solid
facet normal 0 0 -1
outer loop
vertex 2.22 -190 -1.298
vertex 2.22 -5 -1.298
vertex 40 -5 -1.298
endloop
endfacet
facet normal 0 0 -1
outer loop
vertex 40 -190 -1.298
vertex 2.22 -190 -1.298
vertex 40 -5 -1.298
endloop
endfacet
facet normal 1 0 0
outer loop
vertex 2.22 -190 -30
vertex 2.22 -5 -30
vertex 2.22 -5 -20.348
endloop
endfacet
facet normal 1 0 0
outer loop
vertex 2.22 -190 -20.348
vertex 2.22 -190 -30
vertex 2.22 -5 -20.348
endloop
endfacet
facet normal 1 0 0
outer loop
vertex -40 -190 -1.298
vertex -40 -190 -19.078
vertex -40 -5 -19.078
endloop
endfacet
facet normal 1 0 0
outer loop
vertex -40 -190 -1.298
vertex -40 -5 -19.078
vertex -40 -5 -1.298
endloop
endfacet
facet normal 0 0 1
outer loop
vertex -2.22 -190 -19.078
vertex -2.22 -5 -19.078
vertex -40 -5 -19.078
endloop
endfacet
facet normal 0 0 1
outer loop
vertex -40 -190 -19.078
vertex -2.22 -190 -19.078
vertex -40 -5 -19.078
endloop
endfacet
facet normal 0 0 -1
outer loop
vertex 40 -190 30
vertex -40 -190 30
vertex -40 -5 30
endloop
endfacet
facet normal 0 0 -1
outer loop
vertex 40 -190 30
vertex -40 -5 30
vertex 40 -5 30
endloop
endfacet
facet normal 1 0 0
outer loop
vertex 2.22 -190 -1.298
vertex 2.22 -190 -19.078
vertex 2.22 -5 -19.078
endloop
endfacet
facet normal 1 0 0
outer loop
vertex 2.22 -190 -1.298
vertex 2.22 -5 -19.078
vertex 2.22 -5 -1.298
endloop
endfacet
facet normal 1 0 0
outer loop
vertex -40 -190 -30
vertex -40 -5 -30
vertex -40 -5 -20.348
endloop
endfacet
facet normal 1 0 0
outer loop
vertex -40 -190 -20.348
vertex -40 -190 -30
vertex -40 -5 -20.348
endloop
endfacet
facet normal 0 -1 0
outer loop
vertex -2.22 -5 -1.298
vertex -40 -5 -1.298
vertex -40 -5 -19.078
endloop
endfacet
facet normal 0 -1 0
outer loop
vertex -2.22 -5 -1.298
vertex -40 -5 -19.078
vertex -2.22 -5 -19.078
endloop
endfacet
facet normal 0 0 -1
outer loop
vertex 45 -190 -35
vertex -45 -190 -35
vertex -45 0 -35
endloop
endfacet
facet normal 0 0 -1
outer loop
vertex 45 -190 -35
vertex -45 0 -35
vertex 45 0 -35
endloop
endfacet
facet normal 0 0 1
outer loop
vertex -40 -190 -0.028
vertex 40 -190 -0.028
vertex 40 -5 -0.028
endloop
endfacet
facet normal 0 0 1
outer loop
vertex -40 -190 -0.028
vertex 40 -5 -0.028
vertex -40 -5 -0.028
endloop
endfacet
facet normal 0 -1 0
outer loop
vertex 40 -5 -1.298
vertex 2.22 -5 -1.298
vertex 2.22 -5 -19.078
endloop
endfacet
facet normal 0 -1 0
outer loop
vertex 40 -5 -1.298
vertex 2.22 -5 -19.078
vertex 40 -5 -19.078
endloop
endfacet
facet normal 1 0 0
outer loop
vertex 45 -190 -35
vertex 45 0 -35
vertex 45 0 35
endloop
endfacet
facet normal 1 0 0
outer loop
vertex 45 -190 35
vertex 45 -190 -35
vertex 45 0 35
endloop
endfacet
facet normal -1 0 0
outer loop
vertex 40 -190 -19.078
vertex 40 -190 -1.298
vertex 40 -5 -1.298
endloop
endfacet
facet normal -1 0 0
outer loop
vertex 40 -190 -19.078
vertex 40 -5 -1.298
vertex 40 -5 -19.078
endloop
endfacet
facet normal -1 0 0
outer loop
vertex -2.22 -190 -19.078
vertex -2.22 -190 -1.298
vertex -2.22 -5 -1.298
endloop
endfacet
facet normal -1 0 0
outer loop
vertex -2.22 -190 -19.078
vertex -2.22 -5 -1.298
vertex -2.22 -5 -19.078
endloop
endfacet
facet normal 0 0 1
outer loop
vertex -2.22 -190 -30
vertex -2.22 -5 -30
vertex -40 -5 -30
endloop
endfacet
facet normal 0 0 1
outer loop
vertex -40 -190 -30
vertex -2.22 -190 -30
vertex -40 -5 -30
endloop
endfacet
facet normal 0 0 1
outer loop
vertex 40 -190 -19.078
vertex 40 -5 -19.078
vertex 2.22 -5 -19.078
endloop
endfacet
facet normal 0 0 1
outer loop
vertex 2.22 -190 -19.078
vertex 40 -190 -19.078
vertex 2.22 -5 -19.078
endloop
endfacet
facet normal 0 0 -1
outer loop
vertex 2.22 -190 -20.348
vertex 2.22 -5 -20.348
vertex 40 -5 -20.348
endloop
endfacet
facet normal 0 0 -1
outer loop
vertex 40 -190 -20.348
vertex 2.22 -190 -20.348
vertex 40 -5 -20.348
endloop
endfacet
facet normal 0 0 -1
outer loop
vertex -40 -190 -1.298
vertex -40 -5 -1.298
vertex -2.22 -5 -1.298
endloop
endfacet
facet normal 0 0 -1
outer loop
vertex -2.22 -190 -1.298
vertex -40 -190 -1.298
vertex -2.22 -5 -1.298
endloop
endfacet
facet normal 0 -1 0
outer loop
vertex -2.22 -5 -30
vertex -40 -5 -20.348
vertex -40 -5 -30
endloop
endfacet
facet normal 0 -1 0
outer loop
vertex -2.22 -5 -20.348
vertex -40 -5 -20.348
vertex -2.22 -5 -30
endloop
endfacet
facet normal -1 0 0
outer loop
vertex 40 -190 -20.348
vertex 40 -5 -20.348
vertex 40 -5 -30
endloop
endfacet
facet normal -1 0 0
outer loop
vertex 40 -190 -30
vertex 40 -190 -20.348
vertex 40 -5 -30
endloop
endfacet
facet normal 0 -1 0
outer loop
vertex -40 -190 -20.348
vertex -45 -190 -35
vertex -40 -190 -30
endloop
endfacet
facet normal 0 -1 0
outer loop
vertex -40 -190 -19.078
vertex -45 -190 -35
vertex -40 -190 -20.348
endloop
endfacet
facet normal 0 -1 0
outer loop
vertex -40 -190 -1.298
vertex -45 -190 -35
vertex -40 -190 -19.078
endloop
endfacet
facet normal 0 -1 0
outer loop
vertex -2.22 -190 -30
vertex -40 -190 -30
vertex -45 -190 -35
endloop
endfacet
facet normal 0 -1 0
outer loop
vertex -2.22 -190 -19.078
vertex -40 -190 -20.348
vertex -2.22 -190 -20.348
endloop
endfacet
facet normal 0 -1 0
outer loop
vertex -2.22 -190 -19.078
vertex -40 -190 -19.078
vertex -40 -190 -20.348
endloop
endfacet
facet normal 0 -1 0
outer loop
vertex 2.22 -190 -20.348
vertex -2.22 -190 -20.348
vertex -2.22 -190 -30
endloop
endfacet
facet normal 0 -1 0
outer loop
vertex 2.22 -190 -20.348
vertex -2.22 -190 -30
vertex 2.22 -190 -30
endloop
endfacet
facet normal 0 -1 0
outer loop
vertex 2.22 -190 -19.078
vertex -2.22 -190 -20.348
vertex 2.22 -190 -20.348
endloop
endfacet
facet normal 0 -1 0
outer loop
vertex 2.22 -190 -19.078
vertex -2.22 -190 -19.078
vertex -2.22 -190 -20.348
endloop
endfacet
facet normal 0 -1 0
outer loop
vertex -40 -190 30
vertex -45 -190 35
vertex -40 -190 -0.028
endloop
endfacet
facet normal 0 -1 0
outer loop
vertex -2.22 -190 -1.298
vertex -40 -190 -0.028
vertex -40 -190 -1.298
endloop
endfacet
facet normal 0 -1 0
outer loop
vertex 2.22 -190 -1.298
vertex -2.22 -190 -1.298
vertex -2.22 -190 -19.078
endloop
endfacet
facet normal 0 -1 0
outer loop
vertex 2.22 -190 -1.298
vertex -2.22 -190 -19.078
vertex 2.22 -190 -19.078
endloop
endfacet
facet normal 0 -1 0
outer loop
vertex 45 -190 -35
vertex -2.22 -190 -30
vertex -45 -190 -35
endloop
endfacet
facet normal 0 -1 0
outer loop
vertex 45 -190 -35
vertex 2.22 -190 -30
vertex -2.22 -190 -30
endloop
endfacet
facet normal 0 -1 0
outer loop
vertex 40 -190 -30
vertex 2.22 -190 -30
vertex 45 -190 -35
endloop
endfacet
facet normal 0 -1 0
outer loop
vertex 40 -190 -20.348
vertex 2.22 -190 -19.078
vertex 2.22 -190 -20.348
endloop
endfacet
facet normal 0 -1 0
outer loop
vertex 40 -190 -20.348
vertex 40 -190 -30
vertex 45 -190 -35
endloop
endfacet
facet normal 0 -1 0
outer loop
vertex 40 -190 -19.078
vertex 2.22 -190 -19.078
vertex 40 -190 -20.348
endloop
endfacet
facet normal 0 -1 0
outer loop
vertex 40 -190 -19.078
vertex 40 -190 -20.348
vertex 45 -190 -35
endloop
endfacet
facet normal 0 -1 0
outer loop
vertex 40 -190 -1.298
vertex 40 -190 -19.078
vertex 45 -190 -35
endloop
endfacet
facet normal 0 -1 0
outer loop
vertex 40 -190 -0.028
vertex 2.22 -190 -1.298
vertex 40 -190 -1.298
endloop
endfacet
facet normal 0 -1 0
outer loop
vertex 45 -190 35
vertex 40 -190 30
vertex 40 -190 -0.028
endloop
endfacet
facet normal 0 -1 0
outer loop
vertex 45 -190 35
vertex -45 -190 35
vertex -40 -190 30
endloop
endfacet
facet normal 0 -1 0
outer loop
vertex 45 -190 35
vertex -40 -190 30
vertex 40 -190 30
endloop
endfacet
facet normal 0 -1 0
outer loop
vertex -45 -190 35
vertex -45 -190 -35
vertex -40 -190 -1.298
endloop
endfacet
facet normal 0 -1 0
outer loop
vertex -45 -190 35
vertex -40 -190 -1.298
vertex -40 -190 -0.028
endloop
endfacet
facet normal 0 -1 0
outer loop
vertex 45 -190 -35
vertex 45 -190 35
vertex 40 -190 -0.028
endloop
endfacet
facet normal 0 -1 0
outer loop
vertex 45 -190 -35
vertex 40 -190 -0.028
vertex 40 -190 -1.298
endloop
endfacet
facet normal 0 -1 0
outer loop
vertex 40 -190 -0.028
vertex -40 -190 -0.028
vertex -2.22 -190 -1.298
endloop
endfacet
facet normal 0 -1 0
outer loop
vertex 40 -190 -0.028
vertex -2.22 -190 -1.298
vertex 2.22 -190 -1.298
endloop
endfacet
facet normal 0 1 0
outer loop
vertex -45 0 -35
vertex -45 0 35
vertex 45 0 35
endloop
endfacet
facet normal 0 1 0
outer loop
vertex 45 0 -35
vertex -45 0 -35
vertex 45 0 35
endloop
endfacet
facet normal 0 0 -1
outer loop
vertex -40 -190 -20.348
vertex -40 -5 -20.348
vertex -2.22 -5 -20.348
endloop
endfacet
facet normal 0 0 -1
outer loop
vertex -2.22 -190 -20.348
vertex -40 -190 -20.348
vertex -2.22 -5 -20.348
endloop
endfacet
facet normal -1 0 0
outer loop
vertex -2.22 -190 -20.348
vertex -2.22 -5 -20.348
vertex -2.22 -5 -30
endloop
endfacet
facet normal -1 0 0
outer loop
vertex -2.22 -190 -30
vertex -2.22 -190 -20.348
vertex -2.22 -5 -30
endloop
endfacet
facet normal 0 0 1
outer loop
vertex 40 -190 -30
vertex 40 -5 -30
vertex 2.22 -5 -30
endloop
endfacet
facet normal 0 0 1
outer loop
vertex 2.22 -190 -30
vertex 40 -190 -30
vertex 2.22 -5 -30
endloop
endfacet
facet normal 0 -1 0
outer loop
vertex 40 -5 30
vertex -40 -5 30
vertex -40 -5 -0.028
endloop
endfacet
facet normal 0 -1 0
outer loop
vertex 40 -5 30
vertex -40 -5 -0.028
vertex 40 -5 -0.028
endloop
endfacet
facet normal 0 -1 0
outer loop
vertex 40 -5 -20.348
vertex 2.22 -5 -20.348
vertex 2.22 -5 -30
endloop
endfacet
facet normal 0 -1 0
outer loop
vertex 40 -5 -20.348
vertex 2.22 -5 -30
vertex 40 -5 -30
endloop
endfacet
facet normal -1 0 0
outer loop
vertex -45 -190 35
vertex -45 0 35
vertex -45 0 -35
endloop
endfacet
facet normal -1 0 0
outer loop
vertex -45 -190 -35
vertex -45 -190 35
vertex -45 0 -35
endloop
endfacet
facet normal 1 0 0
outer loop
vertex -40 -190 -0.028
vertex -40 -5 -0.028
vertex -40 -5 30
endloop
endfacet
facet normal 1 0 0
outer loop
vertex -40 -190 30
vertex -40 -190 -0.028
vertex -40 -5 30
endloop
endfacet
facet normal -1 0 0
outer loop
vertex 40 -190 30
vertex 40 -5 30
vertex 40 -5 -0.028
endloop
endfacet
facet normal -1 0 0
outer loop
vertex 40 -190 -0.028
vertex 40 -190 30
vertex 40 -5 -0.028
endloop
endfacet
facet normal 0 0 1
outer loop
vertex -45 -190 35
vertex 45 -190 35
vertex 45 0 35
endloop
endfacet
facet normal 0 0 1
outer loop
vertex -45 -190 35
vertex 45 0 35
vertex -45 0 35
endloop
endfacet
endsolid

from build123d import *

# Parameters (mm, degrees)
F1_DEPTH = 190
F0_W     = 80
F0_H     = 30.028
F0_W_2   = 35.56
F0_H_2   = 17.78
F0_H_3   = 9.652
F0_W_3   = 2.22
F2_DEPTH = 5


with BuildPart() as f1:
    # F0 (on Front) → F1 (new body)
    with BuildSketch(Plane.XZ):
        Polygon((45, 30), (45, 35), (-40, 35), (-40, 30.452), (-40, 30), (40, 30), align=None)
        Polygon((-40, 30.452), (-40, 35), (-45, 35), (-45, -30), (-40, -30), (-40, -20.348), (-40, -19.078), (-40, -1.298), (-40, -0.028), (-40, 30), align=None)
        Polygon((45, -30), (45, 30), (40, 30), (40, -0.028), (40, -1.298), (40, -19.078), (40, -20.348), (40, -30), align=None)
        Polygon((45, -35), (45, -30), (40, -30), (4.44, -30), (2.22, -30), (-2.22, -30), (-4.44, -30), (-40, -30), (-45, -30), (-45, -35), align=None)
        Polygon((40, -1.298), (40, -0.028), (-40, -0.028), (-40, -1.298), (-4.44, -1.298), (-2.22, -1.298), (2.22, -1.298), (4.44, -1.298), align=None)
        Polygon((4.44, -20.348), (40, -20.348), (40, -19.078), (4.44, -19.078), (2.22, -19.078), (2.22, -20.348), align=None)
        Polygon((-40, -19.078), (-40, -20.348), (-4.44, -20.348), (-2.22, -20.348), (-2.22, -19.078), (-4.44, -19.078), align=None)
        Polygon((-2.22, -30), (2.22, -30), (2.22, -20.348), (2.22, -19.078), (2.22, -1.298), (-2.22, -1.298), (-2.22, -19.078), (-2.22, -20.348), align=None)
    extrude(amount=F1_DEPTH)

    # F0 (on Front) → F2 (join)
    with BuildSketch(Plane.XZ):
        with Locations((0, 14.986)):
            Rectangle(F0_W, F0_H)
        with Locations((-22.22, -10.188)):
            Rectangle(F0_W_2, F0_H_2)
        with Locations((22.22, -10.188)):
            Rectangle(F0_W_2, F0_H_2)
        with Locations((22.22, -25.174)):
            Rectangle(F0_W_2, F0_H_3)
        with Locations((-22.22, -25.174)):
            Rectangle(F0_W_2, F0_H_3)
        with Locations((-3.33, -10.188)):
            Rectangle(F0_W_3, F0_H_2)
        with Locations((-3.33, -25.174)):
            Rectangle(F0_W_3, F0_H_3)
        with Locations((3.33, -25.174)):
            Rectangle(F0_W_3, F0_H_3)
        with Locations((3.33, -10.188)):
            Rectangle(F0_W_3, F0_H_2)
    extrude(amount=F2_DEPTH)


solid = f1.part
